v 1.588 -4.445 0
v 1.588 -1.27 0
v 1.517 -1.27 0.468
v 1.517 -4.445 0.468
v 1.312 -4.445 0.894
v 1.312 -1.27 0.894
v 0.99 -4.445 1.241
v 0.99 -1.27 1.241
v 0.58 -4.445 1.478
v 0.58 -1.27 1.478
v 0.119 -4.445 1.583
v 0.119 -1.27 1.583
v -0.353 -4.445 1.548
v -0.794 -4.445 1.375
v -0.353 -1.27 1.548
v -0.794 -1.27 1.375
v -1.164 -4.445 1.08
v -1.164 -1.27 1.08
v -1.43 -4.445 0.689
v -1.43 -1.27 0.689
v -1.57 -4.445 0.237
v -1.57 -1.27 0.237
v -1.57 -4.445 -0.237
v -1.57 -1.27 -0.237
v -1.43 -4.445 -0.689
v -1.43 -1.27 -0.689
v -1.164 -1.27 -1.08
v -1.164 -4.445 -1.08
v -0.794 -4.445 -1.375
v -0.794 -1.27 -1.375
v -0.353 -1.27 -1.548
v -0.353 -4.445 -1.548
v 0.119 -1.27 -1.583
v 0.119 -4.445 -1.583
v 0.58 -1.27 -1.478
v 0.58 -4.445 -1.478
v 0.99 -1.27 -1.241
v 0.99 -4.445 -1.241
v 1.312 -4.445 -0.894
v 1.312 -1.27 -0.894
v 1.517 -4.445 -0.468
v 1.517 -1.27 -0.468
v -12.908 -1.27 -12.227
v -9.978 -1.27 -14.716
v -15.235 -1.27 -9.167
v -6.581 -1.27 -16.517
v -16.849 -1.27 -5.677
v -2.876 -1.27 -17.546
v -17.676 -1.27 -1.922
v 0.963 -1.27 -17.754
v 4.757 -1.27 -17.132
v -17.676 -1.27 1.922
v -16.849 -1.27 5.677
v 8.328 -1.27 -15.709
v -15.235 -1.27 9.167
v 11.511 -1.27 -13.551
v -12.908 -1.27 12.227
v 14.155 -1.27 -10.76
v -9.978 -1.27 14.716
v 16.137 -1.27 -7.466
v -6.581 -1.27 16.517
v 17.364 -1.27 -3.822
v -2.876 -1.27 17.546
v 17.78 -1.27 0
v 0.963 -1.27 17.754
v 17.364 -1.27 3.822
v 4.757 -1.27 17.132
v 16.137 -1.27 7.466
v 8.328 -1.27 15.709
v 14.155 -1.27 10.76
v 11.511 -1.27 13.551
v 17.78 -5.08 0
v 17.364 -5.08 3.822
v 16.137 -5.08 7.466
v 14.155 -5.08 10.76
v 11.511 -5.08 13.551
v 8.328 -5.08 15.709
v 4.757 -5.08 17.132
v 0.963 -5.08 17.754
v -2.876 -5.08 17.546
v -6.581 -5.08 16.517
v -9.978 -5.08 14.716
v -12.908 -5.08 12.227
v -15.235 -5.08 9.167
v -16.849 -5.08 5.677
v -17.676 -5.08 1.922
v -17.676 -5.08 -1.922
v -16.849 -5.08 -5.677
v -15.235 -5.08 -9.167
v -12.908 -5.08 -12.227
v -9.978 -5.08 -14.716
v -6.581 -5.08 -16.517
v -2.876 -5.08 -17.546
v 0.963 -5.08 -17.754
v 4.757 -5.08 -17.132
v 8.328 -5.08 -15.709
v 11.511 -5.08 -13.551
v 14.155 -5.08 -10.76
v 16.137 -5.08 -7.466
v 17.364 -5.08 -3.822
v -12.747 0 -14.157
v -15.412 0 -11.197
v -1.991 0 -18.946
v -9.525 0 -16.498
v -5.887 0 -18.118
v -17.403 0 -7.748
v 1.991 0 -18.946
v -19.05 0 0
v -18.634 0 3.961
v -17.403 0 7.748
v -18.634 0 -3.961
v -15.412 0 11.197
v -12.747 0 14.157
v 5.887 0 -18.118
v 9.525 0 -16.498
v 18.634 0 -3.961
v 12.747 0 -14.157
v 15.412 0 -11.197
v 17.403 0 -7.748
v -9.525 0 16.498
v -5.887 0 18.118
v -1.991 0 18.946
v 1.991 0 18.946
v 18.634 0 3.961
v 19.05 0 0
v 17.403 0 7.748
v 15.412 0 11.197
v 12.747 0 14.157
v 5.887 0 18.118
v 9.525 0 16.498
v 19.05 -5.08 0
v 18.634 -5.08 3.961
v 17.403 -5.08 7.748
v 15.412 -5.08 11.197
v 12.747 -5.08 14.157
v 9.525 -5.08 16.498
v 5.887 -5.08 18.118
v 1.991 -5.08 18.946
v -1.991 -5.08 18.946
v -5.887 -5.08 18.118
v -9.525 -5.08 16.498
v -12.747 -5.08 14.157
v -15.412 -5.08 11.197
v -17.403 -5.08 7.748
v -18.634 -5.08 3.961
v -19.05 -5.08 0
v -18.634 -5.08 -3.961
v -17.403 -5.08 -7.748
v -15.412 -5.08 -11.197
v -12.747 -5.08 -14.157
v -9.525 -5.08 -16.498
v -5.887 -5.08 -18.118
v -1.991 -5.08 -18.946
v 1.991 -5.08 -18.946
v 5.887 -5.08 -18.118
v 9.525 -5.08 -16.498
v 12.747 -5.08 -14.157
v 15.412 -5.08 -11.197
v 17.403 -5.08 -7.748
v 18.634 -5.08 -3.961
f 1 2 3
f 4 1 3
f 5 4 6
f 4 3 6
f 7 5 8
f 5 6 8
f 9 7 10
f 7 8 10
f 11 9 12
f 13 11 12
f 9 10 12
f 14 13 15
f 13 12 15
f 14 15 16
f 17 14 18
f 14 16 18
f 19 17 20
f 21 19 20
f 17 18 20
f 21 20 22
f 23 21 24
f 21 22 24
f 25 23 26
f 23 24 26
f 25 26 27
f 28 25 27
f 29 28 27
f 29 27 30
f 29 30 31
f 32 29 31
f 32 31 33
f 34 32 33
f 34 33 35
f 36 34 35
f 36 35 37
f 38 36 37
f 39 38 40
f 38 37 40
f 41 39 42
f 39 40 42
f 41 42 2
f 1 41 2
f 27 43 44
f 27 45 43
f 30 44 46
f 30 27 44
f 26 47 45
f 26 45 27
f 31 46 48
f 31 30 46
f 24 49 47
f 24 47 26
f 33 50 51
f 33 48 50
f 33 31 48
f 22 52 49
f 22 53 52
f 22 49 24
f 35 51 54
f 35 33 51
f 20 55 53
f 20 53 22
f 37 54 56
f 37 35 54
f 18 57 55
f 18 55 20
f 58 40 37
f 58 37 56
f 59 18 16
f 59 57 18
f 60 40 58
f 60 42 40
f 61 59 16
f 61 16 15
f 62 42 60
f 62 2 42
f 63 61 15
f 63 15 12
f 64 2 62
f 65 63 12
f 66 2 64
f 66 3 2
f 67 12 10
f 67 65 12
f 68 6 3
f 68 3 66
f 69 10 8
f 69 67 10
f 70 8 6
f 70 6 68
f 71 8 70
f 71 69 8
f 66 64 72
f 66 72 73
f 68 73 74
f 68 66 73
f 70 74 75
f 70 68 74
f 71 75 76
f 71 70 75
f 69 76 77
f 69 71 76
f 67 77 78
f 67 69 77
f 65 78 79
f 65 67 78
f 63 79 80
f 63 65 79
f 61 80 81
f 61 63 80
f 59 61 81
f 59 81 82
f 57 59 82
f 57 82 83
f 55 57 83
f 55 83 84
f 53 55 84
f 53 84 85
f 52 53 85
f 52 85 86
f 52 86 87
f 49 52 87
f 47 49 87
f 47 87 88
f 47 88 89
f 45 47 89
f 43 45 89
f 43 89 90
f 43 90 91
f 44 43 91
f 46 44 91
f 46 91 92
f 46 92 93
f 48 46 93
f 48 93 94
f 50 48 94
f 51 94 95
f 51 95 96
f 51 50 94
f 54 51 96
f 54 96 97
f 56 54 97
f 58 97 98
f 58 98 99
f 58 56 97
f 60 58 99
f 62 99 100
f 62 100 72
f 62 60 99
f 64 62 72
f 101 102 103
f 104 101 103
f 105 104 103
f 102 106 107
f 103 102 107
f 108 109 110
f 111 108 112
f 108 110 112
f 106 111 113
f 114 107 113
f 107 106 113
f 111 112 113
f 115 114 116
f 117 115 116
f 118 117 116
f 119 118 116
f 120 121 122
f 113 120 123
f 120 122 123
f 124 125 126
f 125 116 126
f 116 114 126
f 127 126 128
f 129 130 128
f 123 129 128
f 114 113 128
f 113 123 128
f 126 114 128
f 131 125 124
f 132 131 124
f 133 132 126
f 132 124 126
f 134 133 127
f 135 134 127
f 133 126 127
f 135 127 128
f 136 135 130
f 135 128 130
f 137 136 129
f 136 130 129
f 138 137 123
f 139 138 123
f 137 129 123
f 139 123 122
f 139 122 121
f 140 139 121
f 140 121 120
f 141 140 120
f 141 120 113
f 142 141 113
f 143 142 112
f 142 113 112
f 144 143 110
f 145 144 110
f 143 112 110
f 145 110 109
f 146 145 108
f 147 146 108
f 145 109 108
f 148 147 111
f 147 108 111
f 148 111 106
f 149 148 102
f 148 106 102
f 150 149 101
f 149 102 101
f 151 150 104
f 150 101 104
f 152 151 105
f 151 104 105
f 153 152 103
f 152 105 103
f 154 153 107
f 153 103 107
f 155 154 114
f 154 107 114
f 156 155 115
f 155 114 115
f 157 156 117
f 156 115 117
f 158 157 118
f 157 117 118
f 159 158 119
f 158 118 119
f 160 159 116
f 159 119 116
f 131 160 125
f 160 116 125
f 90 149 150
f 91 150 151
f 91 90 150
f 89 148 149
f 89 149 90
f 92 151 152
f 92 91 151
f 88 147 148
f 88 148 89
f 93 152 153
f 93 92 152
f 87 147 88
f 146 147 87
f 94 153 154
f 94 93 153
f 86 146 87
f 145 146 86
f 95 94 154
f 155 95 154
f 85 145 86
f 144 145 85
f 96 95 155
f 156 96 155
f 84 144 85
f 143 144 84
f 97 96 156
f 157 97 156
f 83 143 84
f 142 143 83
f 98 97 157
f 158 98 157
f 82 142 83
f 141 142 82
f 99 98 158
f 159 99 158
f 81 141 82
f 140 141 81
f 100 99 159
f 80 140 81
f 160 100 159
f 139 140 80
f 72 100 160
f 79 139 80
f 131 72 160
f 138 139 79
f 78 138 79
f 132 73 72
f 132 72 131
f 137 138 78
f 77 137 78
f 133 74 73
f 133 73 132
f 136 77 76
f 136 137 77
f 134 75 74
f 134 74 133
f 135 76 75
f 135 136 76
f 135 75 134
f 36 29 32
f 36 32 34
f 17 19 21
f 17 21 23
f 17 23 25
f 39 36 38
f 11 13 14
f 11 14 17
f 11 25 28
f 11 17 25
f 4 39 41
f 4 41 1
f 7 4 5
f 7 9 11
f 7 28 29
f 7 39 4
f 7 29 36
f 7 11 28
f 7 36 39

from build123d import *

# Parameters (mm, degrees)
F0_R     = 19.05
F1_DEPTH = 5.08
F2_T     = -1.27
F3_R     = 1.5875
F4_DEPTH = 3.175


with BuildPart() as f1:
    # F0 (on Front) → F1 (new body)
    with BuildSketch(Plane.XZ):
        Circle(F0_R)
    extrude(amount=F1_DEPTH)

    # F2
    f2_openings = [f1.faces().sort_by_distance(p)[0] for p in [
        (0, -5.08, 0),
    ]]
    offset(amount=F2_T, openings=f2_openings)

    # F3 (on face) → F4 (join)
    with BuildSketch(Plane.XZ.offset(1.27)):
        Circle(F3_R)
    extrude(amount=F4_DEPTH)


solid = f1.part
